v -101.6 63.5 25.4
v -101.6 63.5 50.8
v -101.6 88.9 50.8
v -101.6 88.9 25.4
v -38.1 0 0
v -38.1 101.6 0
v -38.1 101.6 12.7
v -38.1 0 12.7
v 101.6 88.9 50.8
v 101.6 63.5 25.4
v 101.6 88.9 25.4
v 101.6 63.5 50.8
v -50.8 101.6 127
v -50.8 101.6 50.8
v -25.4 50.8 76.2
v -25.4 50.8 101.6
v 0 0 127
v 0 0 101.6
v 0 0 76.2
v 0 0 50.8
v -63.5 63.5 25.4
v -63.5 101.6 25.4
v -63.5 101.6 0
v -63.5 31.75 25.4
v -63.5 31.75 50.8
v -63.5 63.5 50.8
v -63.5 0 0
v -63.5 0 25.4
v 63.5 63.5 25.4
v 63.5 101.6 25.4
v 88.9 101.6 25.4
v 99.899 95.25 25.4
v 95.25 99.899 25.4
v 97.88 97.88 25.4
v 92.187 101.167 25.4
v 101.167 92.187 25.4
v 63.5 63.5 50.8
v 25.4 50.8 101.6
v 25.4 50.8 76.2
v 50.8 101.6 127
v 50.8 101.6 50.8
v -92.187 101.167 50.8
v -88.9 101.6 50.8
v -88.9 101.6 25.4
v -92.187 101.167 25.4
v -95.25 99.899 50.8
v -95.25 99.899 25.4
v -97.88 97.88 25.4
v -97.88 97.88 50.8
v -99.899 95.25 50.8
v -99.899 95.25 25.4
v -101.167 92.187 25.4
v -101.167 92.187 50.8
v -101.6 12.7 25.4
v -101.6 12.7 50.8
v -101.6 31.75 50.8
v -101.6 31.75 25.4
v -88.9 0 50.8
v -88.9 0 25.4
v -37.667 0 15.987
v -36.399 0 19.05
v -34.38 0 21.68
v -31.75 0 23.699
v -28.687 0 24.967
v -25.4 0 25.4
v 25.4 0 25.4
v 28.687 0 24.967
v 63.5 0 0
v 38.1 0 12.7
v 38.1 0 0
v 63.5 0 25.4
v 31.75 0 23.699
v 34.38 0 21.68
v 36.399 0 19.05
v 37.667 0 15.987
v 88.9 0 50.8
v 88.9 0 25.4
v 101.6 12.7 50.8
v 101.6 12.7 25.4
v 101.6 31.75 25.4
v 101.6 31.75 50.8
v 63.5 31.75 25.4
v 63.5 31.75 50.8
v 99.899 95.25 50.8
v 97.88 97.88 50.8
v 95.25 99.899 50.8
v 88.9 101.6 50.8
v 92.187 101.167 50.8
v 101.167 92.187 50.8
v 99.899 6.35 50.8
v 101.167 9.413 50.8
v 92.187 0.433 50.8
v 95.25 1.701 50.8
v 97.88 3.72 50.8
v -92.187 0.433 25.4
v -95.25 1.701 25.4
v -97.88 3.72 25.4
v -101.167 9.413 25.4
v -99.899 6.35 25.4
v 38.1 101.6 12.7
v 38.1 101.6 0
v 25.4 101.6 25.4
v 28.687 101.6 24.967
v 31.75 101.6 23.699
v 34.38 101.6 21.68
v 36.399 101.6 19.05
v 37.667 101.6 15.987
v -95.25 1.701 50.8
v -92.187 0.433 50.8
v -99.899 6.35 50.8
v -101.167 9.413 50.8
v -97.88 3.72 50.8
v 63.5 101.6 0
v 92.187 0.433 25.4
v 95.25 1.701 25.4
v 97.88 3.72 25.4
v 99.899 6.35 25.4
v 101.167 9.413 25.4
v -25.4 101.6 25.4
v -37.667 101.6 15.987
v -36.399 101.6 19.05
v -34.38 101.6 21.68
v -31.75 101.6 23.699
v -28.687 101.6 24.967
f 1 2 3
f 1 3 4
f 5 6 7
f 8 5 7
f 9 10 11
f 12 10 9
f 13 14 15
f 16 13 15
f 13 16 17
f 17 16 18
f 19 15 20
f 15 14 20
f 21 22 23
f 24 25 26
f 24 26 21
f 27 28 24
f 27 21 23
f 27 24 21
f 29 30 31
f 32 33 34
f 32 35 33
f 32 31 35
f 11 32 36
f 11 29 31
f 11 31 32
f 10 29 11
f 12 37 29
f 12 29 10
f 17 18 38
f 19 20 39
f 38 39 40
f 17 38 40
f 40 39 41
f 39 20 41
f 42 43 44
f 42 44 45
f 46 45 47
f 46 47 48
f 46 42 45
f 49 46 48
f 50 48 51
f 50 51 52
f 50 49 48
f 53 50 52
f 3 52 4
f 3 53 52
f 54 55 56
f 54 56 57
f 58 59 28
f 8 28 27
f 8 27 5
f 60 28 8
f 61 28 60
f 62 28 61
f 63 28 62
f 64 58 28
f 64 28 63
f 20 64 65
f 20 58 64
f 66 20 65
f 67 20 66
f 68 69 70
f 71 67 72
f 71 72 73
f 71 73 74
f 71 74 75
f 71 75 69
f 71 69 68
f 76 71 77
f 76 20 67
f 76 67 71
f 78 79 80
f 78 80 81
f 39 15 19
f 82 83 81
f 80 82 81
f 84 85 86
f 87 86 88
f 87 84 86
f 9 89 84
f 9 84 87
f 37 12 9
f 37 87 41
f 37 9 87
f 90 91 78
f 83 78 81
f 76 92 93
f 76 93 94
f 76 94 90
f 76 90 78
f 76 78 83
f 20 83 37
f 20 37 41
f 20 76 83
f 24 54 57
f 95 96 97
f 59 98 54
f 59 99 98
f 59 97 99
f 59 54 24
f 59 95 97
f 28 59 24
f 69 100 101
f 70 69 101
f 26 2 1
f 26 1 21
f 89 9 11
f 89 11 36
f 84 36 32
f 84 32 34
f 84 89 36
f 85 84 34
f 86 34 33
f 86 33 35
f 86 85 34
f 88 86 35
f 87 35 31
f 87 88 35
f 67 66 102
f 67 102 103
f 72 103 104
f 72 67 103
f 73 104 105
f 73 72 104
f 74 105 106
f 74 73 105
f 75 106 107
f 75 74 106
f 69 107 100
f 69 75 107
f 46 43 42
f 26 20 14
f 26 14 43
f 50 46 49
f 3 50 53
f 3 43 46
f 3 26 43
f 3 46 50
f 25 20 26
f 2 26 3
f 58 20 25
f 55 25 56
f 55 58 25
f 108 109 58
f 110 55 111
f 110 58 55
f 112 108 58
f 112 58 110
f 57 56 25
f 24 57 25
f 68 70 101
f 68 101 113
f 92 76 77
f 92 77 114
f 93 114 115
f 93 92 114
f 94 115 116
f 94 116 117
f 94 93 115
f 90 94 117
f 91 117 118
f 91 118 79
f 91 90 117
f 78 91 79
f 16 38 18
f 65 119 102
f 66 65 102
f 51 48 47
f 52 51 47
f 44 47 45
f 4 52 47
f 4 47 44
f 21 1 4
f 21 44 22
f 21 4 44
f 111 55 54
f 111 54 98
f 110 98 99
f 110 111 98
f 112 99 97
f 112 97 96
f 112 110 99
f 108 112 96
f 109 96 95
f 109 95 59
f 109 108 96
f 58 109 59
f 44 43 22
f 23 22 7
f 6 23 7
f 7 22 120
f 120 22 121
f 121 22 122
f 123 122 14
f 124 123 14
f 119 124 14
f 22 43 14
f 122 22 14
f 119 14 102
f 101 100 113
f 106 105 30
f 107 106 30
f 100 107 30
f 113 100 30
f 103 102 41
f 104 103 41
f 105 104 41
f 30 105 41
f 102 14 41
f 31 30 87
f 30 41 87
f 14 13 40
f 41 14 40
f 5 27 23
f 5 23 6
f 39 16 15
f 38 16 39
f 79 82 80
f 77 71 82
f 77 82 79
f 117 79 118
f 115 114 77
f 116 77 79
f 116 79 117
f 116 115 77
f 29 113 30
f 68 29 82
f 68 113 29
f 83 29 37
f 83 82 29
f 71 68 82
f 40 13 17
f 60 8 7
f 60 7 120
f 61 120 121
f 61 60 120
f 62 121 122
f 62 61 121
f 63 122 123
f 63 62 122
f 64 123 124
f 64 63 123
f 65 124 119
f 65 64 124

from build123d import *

# Parameters (mm, degrees)
F1_DEPTH = 101.6
F2_W     = 38.1
F2_H     = 31.75
F3_DEPTH = 25.4
F5_DEPTH = 76.2
F7_DEPTH = 50.8
F9_DEPTH = 127


with BuildPart() as f1:
    # F0 (on Front) → F1 (new body)
    with BuildSketch(Plane.XZ):
        with BuildLine():
            Line((-63.5, 0), (-38.1, 0))
            Line((-38.1, 0), (-38.1, 12.7))
            ThreePointArc((-38.1, 12.7), (-34.380256, 21.680256), (-25.4, 25.4))
            Line((-25.4, 25.4), (0, 25.4))
            Line((0, 25.4), (25.4, 25.4))
            ThreePointArc((25.4, 25.4), (34.380256, 21.680256), (38.1, 12.7))
            Line((38.1, 12.7), (38.1, 0))
            Line((38.1, 0), (63.5, 0))
            Line((63.5, 0), (63.5, 25.4))
            Line((63.5, 25.4), (101.6, 25.4))
            Line((101.6, 25.4), (101.6, 50.8))
            Line((101.6, 50.8), (0, 50.8))
            Line((0, 50.8), (-101.6, 50.8))
            Line((-101.6, 50.8), (-101.6, 25.4))
            Line((-101.6, 25.4), (-63.5, 25.4))
            Line((-63.5, 25.4), (-63.5, 0))
        make_face()
    extrude(amount=-F1_DEPTH)

    # F2 (on face) → F3 (cut)
    with BuildSketch(Plane.XY.offset(50.8)):
        with Locations((82.55, 47.625)):
            Rectangle(F2_W, F2_H)
        with Locations((-82.55, 47.625)):
            Rectangle(F2_W, F2_H)
    extrude(amount=-F3_DEPTH, mode=Mode.SUBTRACT)

    # F4 (on face) → F5 (join)
    with BuildSketch(Plane.XY.offset(50.8)):
        Polygon((50.8, 101.6), (-50.8, 101.6), (0, 0), align=None)
    extrude(amount=F5_DEPTH)

    # F6 (on Front) → F7 (cut)
    with BuildSketch(Plane.XZ):
        Polygon((-50.8, 76.2), (0, 76.2), (50.8, 76.2), (50.8, 101.6), (-50.8, 101.6), align=None)
    extrude(amount=-F7_DEPTH, mode=Mode.SUBTRACT)

    # F8 (on Top) → F9 (intersect, symmetric)
    with BuildSketch(Plane.XY):
        with BuildLine():
            Line((0, 101.6), (-88.9, 101.6))
            ThreePointArc((-88.9, 101.6), (-97.880256, 97.880256), (-101.6, 88.9))
            Line((-101.6, 88.9), (-101.6, 12.7))
            ThreePointArc((-101.6, 12.7), (-97.880256, 3.719744), (-88.9, 0))
            Line((-88.9, 0), (0, 0))
            Line((0, 0), (0, 101.6))
        make_face()
        with BuildLine():
            Line((88.9, 101.6), (0, 101.6))
            Line((0, 101.6), (0, 0))
            Line((0, 0), (88.9, 0))
            ThreePointArc((88.9, 0), (97.880256, 3.719744), (101.6, 12.7))
            Line((101.6, 12.7), (101.6, 88.9))
            ThreePointArc((101.6, 88.9), (97.880256, 97.880256), (88.9, 101.6))
        make_face()
    extrude(amount=F9_DEPTH, both=True, mode=Mode.INTERSECT)


solid = f1.part
